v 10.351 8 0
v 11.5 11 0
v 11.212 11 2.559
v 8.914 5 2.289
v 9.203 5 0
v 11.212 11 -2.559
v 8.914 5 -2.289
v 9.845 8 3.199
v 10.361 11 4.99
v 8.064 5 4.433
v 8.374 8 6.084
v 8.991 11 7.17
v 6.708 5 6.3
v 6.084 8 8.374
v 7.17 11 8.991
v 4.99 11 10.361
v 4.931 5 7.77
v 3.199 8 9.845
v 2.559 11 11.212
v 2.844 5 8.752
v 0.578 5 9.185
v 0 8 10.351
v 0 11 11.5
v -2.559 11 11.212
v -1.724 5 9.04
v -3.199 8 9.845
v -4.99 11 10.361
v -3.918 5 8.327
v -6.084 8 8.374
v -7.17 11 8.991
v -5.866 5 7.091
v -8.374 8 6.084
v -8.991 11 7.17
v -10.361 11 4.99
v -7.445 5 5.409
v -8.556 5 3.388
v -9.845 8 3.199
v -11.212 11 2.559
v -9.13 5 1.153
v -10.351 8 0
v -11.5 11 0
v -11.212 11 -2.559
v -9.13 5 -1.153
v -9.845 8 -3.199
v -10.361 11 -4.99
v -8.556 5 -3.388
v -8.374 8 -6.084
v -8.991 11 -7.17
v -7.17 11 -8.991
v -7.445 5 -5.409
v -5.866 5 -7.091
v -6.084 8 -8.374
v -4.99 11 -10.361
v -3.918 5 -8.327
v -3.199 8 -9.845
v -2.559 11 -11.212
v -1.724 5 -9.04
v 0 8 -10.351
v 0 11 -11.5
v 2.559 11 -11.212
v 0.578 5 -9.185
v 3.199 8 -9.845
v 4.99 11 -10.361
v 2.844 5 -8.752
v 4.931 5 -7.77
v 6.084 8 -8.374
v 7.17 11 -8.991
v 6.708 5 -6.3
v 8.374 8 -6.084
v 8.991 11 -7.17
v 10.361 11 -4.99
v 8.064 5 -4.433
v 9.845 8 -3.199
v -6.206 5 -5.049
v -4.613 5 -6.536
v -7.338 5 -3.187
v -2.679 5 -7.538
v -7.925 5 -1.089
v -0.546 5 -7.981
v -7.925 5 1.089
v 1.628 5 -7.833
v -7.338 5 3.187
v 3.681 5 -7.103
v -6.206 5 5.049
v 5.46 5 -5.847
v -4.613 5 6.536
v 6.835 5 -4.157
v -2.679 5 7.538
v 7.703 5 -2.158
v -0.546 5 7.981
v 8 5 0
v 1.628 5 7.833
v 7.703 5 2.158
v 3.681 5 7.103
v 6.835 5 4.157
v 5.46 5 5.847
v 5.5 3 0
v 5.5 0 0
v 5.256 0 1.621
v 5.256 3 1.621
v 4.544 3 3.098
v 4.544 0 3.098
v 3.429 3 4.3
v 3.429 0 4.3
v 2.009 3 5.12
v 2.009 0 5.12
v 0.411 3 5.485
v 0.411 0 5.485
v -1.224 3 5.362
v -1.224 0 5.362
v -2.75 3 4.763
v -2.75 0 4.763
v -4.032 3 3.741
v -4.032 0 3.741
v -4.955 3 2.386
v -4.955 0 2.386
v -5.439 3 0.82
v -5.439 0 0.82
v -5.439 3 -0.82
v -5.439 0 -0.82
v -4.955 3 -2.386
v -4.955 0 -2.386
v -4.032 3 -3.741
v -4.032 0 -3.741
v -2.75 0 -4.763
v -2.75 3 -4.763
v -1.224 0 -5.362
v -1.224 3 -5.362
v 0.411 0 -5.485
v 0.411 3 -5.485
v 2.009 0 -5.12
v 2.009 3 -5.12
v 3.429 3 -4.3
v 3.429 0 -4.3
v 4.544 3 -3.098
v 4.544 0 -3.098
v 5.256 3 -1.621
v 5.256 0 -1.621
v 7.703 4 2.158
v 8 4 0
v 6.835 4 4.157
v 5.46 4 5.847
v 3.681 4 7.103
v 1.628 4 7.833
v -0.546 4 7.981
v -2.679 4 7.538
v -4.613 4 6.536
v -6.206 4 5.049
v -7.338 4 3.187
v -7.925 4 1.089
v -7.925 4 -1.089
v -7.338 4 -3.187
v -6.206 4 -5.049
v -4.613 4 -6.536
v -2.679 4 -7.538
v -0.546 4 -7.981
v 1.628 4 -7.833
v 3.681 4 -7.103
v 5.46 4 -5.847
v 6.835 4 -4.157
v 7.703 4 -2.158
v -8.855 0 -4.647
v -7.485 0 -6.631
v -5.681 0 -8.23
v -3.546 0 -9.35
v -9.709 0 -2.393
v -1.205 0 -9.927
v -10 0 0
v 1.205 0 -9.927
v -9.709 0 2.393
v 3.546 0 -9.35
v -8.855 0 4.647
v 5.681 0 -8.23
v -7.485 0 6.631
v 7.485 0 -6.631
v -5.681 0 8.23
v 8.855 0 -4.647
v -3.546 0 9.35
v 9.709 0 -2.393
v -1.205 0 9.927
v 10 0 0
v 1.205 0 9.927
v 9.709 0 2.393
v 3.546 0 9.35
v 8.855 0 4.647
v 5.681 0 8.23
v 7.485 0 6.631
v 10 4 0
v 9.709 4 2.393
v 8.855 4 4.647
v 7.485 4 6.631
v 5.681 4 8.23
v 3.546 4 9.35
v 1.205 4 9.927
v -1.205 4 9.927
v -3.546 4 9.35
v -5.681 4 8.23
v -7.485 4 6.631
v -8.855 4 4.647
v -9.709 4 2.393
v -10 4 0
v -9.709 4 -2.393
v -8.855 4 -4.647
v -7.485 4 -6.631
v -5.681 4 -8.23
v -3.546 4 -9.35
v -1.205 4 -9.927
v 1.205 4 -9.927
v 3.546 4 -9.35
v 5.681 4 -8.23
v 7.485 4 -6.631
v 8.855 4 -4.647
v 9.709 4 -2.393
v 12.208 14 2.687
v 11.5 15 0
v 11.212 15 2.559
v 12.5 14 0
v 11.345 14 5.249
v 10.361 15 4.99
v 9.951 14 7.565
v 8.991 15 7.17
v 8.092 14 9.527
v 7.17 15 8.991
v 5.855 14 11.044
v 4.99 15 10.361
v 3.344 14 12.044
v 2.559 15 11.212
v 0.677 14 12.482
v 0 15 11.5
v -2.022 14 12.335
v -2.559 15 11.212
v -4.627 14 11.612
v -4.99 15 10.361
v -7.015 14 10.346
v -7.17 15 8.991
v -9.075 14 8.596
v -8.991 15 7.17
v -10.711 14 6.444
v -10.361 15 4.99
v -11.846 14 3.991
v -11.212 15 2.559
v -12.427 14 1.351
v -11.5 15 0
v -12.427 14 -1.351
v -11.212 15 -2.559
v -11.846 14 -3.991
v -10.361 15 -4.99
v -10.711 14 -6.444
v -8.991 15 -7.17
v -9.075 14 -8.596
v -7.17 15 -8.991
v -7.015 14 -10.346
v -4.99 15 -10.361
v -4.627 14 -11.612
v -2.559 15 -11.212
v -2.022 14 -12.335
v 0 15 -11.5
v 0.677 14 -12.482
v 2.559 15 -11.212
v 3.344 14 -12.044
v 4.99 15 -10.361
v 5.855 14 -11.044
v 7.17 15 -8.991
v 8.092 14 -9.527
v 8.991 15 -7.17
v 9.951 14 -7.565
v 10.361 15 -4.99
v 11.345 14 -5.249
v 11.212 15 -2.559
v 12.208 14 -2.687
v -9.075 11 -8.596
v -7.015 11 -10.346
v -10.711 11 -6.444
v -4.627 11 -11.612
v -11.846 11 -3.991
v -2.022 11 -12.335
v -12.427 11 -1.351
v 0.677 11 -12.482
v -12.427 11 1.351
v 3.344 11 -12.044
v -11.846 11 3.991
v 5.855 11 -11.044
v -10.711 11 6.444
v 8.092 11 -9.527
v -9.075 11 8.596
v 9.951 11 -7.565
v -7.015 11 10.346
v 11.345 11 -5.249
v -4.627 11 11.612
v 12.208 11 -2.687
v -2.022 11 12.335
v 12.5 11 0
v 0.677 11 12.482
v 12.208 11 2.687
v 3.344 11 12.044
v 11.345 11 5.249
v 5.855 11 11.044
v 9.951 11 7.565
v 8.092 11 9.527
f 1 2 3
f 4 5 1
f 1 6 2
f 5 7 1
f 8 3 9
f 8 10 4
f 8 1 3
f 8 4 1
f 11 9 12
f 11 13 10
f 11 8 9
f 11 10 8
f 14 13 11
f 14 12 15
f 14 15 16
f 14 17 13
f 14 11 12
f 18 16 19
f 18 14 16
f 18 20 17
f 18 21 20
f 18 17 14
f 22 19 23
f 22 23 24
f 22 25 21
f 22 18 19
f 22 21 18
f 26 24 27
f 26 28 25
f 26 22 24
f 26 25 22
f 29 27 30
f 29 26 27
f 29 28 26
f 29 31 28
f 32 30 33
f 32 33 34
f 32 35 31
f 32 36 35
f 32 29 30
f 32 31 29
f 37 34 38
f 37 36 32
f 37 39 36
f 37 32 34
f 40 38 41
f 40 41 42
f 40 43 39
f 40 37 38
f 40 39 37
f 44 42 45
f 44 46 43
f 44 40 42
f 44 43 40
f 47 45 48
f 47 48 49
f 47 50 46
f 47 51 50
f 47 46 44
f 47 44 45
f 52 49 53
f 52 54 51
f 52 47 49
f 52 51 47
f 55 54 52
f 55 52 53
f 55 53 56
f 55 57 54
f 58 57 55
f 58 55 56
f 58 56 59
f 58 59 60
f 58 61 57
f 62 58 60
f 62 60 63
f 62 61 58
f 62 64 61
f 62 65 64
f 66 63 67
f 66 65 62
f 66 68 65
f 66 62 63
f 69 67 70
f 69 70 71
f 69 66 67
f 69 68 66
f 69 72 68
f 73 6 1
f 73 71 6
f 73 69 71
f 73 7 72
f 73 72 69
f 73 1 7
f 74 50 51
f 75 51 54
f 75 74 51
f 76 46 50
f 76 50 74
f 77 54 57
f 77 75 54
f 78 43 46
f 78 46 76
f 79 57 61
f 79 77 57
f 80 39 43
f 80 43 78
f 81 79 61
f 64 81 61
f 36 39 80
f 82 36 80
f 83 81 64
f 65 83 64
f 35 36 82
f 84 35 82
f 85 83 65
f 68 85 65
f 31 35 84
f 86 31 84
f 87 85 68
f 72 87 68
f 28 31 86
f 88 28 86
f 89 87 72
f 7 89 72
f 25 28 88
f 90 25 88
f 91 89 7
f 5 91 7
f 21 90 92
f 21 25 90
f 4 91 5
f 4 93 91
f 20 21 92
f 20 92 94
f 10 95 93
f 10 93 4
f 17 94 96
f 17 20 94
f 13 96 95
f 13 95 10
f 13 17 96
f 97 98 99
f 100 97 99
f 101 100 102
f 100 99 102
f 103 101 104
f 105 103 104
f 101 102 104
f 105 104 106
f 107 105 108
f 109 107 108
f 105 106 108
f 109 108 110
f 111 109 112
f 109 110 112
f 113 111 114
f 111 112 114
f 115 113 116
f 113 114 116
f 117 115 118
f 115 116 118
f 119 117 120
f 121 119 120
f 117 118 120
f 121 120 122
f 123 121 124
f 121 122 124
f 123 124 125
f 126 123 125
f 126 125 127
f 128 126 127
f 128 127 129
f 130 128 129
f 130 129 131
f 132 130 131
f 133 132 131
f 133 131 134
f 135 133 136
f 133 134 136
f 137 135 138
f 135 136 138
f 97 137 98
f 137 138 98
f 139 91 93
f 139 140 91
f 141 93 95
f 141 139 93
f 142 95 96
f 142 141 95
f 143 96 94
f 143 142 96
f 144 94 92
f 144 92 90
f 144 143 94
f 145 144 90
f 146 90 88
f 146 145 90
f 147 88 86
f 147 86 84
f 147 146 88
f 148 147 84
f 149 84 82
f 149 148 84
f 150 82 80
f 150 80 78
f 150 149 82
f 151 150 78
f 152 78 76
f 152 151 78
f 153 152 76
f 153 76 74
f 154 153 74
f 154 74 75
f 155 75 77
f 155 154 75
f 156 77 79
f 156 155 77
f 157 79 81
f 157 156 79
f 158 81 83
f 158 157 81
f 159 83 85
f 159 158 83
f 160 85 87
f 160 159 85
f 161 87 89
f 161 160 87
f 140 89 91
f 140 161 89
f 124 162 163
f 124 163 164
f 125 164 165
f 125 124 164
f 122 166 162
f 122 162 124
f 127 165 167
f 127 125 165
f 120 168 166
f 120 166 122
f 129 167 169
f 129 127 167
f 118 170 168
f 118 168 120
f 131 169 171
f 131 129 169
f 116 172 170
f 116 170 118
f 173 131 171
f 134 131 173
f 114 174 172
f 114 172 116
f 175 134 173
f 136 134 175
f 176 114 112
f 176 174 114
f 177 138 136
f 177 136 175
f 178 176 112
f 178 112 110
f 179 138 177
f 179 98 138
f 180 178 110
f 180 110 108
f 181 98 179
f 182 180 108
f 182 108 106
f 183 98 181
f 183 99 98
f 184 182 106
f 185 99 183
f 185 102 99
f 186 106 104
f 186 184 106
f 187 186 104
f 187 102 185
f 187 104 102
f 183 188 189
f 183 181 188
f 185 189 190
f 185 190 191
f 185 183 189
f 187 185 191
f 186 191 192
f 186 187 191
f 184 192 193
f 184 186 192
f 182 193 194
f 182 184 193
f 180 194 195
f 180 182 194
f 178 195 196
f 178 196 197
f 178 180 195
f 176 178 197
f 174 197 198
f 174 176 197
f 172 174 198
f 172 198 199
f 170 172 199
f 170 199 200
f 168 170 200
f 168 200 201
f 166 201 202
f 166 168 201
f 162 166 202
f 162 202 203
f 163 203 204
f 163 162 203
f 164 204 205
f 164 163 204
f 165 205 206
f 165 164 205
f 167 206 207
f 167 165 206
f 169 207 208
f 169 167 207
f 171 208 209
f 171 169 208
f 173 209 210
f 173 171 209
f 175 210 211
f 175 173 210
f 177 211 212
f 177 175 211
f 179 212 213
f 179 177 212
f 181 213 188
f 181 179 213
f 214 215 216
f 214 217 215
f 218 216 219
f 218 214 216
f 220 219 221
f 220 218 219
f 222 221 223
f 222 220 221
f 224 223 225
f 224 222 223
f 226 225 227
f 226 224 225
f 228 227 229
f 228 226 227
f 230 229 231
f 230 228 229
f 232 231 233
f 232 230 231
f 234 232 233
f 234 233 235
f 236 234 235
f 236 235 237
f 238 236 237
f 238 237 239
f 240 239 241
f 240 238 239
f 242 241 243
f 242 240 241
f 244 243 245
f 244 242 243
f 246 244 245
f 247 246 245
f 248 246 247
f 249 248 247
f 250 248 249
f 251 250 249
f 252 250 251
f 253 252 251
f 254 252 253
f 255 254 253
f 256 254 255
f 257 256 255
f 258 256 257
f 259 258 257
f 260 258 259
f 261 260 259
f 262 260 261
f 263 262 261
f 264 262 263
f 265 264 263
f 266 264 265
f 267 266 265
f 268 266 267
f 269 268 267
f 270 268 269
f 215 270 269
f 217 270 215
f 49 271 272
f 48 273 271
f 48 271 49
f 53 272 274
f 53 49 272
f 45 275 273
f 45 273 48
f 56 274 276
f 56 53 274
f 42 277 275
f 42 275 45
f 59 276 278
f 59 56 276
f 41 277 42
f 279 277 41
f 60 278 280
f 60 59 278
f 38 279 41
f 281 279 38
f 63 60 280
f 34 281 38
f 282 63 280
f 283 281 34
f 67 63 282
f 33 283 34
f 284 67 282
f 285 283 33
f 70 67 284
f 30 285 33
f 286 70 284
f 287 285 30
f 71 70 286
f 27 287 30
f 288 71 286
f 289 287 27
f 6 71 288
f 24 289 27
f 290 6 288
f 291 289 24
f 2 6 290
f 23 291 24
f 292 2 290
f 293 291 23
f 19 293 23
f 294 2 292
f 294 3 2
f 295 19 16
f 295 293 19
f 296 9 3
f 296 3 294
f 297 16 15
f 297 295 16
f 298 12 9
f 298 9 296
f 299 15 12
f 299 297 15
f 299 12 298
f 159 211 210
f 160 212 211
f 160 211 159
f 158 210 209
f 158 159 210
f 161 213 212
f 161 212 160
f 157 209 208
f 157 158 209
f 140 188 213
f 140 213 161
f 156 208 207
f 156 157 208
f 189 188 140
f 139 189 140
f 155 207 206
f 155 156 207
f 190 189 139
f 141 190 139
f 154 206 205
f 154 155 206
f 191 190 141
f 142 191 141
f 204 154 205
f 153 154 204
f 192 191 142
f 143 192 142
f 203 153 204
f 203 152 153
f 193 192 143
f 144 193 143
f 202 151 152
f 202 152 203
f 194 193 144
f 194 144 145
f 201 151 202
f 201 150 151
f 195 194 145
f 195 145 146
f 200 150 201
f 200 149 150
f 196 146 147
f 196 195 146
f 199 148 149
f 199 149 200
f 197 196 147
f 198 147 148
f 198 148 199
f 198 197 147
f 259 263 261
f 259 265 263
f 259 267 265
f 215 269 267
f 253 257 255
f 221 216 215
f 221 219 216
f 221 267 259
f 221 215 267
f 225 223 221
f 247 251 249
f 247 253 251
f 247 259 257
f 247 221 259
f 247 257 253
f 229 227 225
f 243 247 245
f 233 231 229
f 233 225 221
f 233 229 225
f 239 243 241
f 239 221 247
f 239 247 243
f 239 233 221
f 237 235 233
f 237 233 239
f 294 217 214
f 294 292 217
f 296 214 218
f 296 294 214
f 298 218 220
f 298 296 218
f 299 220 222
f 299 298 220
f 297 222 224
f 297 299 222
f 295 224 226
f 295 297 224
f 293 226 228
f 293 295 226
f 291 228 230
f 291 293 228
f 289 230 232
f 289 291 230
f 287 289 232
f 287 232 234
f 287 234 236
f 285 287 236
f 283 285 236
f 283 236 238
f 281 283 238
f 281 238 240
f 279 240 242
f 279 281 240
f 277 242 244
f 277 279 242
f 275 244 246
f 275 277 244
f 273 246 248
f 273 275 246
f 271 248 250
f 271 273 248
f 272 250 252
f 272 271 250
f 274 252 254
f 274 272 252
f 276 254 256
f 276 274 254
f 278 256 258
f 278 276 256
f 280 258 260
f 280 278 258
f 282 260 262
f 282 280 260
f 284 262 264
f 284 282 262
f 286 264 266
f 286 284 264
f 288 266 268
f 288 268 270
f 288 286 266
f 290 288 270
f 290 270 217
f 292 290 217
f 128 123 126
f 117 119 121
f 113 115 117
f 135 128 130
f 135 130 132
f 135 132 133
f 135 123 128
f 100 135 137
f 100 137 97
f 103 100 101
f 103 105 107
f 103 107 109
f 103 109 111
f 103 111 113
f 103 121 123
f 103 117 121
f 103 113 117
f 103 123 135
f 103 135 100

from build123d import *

# Parameters (mm, degrees)
SKETCH3_R          = 5.5
CUT_EXTRUDE1_DEPTH = 3


with BuildPart() as part:
    # Sketch2 → Revolve1 (revolve)
    with BuildSketch(Plane.XY):
        Polygon((0, 0), (0, 15), (11.5, 15), (12.5, 14), (12.5, 11), (11.5, 11), (9.202672606, 5), (8, 5), (8, 4), (10, 4), (10, 0), align=None)
    revolve(axis=Axis((0, 15.75, 0), (0, -1, 0)))

    # Sketch3 → Cut-Extrude1 (cut)
    with BuildSketch(Plane.XZ):
        Circle(SKETCH3_R)
    extrude(amount=-CUT_EXTRUDE1_DEPTH, mode=Mode.SUBTRACT)


solid = part.part
